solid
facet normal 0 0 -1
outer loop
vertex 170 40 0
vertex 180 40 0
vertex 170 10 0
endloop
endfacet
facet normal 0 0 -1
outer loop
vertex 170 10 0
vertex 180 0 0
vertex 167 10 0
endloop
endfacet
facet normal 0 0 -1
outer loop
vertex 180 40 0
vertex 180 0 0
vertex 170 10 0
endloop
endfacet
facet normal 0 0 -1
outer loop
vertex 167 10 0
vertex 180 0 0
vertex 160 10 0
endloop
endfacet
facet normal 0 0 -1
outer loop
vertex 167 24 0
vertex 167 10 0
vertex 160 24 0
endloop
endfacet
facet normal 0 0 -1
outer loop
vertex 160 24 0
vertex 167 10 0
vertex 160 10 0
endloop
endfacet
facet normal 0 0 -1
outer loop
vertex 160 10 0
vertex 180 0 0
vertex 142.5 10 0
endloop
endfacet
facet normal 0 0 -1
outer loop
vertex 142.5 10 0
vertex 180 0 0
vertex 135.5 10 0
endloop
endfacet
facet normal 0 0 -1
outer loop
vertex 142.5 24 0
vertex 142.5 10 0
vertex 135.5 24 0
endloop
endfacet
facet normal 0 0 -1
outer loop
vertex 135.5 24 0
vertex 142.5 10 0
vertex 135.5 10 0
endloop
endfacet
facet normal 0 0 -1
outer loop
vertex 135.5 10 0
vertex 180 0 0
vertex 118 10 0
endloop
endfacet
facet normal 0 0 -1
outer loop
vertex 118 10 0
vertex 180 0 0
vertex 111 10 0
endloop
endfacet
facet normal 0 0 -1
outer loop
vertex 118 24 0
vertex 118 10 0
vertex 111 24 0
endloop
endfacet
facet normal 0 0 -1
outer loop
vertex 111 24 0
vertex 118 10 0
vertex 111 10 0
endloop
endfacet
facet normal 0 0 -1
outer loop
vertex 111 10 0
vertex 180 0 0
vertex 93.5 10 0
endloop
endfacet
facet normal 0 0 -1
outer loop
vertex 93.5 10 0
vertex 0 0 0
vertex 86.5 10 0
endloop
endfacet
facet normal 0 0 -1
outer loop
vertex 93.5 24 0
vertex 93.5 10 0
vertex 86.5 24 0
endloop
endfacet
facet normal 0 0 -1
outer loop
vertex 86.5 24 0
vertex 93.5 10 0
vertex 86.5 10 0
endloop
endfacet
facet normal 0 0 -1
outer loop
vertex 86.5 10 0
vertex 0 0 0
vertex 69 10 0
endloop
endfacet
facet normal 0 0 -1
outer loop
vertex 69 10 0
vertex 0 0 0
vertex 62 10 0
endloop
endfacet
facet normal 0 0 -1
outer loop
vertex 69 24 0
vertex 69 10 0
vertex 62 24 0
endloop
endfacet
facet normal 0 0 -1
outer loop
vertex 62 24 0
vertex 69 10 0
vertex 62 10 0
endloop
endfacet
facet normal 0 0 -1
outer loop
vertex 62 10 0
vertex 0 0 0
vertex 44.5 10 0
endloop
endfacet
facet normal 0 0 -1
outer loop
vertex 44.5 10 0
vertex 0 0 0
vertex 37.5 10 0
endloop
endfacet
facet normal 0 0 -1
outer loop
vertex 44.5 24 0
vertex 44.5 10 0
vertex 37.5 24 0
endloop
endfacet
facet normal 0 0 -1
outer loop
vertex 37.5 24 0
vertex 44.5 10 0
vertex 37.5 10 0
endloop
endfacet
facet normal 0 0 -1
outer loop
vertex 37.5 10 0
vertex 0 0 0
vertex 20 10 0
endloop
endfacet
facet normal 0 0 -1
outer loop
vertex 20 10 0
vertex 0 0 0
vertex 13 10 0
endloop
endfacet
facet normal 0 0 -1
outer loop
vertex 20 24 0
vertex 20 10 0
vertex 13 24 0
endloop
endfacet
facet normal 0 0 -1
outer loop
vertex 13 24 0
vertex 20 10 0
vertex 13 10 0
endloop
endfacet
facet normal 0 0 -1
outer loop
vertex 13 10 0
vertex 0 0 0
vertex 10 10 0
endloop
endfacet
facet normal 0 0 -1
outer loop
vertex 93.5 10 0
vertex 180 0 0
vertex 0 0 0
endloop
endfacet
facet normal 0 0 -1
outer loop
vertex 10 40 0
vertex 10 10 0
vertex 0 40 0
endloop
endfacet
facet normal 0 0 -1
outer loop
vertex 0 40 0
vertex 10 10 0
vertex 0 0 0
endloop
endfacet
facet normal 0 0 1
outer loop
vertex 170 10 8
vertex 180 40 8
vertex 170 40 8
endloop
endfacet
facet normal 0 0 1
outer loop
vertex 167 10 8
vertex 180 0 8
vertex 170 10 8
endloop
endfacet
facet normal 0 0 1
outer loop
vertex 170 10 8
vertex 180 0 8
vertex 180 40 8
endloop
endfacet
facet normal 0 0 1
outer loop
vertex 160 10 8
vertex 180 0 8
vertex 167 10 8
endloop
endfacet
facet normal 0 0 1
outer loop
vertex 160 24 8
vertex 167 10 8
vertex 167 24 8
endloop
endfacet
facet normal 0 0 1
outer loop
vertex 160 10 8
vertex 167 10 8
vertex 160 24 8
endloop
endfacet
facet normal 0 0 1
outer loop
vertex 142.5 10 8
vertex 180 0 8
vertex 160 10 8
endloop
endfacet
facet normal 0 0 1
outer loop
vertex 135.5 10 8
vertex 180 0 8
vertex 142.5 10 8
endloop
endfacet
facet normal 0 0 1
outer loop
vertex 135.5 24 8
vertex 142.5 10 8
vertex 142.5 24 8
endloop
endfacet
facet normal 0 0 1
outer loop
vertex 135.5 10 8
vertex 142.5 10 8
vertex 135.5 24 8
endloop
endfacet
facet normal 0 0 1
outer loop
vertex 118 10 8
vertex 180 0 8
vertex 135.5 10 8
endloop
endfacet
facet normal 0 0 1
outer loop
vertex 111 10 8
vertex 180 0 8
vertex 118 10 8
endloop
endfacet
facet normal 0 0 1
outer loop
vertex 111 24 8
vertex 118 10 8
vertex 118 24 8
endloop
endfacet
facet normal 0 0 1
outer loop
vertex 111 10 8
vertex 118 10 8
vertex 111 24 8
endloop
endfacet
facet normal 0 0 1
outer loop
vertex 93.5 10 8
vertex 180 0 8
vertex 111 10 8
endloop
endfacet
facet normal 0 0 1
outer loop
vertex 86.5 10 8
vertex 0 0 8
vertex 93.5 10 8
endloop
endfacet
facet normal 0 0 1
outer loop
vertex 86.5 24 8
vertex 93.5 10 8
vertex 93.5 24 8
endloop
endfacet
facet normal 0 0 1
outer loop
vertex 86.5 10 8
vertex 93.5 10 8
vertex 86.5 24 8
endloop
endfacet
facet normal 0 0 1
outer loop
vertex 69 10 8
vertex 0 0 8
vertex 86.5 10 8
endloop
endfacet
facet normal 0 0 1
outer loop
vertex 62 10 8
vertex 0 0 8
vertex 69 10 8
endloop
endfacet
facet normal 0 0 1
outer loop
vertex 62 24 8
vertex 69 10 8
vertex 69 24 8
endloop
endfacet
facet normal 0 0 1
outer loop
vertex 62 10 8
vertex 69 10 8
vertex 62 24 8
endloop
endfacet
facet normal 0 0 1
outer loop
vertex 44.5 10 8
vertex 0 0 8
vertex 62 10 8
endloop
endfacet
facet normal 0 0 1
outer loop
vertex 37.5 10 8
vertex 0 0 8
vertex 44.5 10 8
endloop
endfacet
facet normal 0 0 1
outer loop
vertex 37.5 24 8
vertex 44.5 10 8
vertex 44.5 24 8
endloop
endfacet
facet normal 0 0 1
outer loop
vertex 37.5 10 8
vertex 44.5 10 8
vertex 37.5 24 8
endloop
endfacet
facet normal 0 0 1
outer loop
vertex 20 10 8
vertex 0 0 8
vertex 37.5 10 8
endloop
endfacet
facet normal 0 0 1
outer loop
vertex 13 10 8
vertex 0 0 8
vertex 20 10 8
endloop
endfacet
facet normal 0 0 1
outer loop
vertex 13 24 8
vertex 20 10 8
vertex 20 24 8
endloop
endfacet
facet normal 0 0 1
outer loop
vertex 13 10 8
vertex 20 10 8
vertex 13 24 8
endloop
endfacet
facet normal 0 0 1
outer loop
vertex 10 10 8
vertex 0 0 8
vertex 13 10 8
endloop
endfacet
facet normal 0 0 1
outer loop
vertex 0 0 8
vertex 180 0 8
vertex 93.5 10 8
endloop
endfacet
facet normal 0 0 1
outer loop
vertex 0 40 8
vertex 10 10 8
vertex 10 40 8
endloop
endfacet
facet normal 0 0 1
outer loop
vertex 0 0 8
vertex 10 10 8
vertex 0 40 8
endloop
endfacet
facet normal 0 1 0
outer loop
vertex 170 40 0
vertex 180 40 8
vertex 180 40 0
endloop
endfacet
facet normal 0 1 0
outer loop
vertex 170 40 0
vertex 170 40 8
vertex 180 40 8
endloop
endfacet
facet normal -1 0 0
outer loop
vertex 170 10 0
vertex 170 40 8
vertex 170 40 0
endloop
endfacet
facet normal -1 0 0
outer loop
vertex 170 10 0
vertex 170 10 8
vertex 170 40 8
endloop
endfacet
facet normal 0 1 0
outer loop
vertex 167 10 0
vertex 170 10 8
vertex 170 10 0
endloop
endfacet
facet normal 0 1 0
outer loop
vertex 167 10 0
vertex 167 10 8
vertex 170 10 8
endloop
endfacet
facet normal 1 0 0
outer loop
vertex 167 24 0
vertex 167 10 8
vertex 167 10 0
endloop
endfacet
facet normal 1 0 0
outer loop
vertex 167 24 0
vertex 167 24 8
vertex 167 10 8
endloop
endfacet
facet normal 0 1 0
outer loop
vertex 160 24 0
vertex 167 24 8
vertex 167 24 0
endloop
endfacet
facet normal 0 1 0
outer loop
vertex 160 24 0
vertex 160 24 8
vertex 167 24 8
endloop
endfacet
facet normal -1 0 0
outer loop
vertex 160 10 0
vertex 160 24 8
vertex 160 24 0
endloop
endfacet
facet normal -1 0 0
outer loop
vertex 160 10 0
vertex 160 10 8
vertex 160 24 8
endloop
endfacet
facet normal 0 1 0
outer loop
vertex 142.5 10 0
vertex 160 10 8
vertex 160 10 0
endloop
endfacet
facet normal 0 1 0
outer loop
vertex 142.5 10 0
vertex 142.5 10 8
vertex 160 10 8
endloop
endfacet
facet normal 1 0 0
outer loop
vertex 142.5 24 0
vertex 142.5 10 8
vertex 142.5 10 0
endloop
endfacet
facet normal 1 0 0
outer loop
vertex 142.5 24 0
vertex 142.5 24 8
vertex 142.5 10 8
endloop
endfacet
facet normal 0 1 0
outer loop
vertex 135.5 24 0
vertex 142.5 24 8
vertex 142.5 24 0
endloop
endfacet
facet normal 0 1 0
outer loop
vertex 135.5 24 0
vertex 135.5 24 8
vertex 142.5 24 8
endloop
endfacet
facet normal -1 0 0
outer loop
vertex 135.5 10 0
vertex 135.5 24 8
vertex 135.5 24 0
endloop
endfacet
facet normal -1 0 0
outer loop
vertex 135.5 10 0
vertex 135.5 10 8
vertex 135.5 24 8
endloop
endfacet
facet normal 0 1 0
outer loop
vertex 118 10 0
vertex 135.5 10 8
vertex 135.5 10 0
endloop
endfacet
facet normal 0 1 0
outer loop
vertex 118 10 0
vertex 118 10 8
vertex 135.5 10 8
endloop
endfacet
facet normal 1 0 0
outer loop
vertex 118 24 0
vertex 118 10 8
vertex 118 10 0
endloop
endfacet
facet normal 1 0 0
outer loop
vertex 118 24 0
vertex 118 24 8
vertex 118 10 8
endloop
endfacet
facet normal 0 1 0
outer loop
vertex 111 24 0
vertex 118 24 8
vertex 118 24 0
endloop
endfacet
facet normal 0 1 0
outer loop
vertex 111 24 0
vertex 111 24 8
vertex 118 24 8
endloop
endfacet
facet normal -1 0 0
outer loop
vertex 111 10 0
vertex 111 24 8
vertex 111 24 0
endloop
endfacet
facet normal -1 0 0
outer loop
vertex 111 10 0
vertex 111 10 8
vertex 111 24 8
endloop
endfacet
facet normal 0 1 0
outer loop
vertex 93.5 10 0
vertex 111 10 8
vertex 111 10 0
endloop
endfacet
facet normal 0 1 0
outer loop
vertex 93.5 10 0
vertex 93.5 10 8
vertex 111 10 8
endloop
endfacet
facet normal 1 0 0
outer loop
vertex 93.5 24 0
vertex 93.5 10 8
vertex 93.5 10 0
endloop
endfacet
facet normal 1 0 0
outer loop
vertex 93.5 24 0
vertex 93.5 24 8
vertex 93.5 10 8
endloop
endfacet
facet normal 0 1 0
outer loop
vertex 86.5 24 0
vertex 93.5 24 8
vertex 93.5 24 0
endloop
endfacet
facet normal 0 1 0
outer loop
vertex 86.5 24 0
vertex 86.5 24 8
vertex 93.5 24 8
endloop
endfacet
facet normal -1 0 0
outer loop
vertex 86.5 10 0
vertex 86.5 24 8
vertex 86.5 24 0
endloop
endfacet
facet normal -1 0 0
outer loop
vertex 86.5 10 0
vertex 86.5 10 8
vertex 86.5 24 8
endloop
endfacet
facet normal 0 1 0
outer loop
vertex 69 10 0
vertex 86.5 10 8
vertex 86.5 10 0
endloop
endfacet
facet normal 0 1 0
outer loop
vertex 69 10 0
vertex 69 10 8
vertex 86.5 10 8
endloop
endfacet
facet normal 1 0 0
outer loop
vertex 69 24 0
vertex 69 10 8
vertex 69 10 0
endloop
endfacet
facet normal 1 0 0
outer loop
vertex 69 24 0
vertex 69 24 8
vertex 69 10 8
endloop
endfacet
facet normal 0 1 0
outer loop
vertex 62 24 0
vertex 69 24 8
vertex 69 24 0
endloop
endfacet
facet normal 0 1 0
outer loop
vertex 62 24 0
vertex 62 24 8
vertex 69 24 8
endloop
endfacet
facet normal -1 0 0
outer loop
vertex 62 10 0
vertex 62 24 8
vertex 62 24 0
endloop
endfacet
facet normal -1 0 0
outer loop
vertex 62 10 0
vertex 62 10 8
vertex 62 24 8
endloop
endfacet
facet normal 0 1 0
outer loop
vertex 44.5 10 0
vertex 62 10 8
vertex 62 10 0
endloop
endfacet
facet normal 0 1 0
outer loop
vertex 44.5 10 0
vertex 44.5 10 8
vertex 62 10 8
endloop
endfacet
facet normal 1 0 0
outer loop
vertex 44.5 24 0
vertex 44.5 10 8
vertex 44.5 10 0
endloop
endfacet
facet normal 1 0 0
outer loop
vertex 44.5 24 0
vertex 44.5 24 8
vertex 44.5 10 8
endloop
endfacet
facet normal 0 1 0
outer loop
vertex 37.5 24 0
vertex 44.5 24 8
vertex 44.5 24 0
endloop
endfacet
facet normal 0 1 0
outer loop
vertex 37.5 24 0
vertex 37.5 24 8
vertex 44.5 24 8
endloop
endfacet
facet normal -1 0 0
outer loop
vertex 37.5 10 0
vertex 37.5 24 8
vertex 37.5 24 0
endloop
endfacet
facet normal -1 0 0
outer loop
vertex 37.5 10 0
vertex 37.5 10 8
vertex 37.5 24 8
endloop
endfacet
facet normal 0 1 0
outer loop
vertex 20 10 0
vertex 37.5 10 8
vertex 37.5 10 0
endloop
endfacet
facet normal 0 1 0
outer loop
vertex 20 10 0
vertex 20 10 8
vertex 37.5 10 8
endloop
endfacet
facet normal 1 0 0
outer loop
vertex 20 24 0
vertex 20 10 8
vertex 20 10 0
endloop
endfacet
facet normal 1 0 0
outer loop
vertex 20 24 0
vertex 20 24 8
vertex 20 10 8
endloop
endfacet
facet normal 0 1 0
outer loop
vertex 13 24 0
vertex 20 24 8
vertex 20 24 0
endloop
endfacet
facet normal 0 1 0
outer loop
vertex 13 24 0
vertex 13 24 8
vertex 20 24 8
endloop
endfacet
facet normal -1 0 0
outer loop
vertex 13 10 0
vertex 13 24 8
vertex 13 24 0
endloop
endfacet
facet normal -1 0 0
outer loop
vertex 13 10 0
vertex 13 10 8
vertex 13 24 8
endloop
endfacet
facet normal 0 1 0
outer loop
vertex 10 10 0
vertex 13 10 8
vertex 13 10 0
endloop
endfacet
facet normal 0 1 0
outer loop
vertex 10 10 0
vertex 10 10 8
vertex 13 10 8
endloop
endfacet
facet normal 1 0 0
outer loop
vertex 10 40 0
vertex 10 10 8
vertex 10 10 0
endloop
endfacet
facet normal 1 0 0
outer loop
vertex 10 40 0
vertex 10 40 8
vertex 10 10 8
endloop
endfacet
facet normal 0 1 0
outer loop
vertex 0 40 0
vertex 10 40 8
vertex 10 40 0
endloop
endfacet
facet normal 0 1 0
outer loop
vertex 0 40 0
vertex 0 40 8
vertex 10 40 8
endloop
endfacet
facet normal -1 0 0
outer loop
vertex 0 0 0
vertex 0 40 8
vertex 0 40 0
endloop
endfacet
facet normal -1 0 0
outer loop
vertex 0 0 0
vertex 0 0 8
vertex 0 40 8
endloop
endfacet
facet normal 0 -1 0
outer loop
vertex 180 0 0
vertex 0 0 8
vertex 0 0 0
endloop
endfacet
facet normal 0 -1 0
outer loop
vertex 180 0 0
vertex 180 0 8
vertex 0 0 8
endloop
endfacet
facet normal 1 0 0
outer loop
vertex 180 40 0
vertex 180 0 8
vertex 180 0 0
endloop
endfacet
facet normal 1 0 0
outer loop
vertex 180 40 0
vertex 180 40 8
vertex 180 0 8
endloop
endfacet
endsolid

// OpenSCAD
$fn = 32;

// ----------------------------------------------------------------------
// Guard grille: 7 slats over a 180 x 40 mm plate
// ----------------------------------------------------------------------

// --- parameters (mm) ---
profile_height = 8;       // extrusion height
profile_points = 36;      // points of the closed outline

profile = [[0, 0], [180, 0], [180, 40], [170, 40], [170, 10], [167, 10], [167, 24], [160, 24], [160, 10], [142.5, 10], [142.5, 24], [135.5, 24], [135.5, 10], [118, 10], [118, 24], [111, 24], [111, 10], [93.5, 10], [93.5, 24], [86.5, 24], [86.5, 10], [69, 10], [69, 24], [62, 24], [62, 10], [44.5, 10], [44.5, 24], [37.5, 24], [37.5, 10], [20, 10], [20, 24], [13, 24], [13, 10], [10, 10], [10, 40], [0, 40]];  // single closed polygon, 36 points, counter clockwise

// --- the one profile operation ---
linear_extrude(height = profile_height) polygon(points = profile);
